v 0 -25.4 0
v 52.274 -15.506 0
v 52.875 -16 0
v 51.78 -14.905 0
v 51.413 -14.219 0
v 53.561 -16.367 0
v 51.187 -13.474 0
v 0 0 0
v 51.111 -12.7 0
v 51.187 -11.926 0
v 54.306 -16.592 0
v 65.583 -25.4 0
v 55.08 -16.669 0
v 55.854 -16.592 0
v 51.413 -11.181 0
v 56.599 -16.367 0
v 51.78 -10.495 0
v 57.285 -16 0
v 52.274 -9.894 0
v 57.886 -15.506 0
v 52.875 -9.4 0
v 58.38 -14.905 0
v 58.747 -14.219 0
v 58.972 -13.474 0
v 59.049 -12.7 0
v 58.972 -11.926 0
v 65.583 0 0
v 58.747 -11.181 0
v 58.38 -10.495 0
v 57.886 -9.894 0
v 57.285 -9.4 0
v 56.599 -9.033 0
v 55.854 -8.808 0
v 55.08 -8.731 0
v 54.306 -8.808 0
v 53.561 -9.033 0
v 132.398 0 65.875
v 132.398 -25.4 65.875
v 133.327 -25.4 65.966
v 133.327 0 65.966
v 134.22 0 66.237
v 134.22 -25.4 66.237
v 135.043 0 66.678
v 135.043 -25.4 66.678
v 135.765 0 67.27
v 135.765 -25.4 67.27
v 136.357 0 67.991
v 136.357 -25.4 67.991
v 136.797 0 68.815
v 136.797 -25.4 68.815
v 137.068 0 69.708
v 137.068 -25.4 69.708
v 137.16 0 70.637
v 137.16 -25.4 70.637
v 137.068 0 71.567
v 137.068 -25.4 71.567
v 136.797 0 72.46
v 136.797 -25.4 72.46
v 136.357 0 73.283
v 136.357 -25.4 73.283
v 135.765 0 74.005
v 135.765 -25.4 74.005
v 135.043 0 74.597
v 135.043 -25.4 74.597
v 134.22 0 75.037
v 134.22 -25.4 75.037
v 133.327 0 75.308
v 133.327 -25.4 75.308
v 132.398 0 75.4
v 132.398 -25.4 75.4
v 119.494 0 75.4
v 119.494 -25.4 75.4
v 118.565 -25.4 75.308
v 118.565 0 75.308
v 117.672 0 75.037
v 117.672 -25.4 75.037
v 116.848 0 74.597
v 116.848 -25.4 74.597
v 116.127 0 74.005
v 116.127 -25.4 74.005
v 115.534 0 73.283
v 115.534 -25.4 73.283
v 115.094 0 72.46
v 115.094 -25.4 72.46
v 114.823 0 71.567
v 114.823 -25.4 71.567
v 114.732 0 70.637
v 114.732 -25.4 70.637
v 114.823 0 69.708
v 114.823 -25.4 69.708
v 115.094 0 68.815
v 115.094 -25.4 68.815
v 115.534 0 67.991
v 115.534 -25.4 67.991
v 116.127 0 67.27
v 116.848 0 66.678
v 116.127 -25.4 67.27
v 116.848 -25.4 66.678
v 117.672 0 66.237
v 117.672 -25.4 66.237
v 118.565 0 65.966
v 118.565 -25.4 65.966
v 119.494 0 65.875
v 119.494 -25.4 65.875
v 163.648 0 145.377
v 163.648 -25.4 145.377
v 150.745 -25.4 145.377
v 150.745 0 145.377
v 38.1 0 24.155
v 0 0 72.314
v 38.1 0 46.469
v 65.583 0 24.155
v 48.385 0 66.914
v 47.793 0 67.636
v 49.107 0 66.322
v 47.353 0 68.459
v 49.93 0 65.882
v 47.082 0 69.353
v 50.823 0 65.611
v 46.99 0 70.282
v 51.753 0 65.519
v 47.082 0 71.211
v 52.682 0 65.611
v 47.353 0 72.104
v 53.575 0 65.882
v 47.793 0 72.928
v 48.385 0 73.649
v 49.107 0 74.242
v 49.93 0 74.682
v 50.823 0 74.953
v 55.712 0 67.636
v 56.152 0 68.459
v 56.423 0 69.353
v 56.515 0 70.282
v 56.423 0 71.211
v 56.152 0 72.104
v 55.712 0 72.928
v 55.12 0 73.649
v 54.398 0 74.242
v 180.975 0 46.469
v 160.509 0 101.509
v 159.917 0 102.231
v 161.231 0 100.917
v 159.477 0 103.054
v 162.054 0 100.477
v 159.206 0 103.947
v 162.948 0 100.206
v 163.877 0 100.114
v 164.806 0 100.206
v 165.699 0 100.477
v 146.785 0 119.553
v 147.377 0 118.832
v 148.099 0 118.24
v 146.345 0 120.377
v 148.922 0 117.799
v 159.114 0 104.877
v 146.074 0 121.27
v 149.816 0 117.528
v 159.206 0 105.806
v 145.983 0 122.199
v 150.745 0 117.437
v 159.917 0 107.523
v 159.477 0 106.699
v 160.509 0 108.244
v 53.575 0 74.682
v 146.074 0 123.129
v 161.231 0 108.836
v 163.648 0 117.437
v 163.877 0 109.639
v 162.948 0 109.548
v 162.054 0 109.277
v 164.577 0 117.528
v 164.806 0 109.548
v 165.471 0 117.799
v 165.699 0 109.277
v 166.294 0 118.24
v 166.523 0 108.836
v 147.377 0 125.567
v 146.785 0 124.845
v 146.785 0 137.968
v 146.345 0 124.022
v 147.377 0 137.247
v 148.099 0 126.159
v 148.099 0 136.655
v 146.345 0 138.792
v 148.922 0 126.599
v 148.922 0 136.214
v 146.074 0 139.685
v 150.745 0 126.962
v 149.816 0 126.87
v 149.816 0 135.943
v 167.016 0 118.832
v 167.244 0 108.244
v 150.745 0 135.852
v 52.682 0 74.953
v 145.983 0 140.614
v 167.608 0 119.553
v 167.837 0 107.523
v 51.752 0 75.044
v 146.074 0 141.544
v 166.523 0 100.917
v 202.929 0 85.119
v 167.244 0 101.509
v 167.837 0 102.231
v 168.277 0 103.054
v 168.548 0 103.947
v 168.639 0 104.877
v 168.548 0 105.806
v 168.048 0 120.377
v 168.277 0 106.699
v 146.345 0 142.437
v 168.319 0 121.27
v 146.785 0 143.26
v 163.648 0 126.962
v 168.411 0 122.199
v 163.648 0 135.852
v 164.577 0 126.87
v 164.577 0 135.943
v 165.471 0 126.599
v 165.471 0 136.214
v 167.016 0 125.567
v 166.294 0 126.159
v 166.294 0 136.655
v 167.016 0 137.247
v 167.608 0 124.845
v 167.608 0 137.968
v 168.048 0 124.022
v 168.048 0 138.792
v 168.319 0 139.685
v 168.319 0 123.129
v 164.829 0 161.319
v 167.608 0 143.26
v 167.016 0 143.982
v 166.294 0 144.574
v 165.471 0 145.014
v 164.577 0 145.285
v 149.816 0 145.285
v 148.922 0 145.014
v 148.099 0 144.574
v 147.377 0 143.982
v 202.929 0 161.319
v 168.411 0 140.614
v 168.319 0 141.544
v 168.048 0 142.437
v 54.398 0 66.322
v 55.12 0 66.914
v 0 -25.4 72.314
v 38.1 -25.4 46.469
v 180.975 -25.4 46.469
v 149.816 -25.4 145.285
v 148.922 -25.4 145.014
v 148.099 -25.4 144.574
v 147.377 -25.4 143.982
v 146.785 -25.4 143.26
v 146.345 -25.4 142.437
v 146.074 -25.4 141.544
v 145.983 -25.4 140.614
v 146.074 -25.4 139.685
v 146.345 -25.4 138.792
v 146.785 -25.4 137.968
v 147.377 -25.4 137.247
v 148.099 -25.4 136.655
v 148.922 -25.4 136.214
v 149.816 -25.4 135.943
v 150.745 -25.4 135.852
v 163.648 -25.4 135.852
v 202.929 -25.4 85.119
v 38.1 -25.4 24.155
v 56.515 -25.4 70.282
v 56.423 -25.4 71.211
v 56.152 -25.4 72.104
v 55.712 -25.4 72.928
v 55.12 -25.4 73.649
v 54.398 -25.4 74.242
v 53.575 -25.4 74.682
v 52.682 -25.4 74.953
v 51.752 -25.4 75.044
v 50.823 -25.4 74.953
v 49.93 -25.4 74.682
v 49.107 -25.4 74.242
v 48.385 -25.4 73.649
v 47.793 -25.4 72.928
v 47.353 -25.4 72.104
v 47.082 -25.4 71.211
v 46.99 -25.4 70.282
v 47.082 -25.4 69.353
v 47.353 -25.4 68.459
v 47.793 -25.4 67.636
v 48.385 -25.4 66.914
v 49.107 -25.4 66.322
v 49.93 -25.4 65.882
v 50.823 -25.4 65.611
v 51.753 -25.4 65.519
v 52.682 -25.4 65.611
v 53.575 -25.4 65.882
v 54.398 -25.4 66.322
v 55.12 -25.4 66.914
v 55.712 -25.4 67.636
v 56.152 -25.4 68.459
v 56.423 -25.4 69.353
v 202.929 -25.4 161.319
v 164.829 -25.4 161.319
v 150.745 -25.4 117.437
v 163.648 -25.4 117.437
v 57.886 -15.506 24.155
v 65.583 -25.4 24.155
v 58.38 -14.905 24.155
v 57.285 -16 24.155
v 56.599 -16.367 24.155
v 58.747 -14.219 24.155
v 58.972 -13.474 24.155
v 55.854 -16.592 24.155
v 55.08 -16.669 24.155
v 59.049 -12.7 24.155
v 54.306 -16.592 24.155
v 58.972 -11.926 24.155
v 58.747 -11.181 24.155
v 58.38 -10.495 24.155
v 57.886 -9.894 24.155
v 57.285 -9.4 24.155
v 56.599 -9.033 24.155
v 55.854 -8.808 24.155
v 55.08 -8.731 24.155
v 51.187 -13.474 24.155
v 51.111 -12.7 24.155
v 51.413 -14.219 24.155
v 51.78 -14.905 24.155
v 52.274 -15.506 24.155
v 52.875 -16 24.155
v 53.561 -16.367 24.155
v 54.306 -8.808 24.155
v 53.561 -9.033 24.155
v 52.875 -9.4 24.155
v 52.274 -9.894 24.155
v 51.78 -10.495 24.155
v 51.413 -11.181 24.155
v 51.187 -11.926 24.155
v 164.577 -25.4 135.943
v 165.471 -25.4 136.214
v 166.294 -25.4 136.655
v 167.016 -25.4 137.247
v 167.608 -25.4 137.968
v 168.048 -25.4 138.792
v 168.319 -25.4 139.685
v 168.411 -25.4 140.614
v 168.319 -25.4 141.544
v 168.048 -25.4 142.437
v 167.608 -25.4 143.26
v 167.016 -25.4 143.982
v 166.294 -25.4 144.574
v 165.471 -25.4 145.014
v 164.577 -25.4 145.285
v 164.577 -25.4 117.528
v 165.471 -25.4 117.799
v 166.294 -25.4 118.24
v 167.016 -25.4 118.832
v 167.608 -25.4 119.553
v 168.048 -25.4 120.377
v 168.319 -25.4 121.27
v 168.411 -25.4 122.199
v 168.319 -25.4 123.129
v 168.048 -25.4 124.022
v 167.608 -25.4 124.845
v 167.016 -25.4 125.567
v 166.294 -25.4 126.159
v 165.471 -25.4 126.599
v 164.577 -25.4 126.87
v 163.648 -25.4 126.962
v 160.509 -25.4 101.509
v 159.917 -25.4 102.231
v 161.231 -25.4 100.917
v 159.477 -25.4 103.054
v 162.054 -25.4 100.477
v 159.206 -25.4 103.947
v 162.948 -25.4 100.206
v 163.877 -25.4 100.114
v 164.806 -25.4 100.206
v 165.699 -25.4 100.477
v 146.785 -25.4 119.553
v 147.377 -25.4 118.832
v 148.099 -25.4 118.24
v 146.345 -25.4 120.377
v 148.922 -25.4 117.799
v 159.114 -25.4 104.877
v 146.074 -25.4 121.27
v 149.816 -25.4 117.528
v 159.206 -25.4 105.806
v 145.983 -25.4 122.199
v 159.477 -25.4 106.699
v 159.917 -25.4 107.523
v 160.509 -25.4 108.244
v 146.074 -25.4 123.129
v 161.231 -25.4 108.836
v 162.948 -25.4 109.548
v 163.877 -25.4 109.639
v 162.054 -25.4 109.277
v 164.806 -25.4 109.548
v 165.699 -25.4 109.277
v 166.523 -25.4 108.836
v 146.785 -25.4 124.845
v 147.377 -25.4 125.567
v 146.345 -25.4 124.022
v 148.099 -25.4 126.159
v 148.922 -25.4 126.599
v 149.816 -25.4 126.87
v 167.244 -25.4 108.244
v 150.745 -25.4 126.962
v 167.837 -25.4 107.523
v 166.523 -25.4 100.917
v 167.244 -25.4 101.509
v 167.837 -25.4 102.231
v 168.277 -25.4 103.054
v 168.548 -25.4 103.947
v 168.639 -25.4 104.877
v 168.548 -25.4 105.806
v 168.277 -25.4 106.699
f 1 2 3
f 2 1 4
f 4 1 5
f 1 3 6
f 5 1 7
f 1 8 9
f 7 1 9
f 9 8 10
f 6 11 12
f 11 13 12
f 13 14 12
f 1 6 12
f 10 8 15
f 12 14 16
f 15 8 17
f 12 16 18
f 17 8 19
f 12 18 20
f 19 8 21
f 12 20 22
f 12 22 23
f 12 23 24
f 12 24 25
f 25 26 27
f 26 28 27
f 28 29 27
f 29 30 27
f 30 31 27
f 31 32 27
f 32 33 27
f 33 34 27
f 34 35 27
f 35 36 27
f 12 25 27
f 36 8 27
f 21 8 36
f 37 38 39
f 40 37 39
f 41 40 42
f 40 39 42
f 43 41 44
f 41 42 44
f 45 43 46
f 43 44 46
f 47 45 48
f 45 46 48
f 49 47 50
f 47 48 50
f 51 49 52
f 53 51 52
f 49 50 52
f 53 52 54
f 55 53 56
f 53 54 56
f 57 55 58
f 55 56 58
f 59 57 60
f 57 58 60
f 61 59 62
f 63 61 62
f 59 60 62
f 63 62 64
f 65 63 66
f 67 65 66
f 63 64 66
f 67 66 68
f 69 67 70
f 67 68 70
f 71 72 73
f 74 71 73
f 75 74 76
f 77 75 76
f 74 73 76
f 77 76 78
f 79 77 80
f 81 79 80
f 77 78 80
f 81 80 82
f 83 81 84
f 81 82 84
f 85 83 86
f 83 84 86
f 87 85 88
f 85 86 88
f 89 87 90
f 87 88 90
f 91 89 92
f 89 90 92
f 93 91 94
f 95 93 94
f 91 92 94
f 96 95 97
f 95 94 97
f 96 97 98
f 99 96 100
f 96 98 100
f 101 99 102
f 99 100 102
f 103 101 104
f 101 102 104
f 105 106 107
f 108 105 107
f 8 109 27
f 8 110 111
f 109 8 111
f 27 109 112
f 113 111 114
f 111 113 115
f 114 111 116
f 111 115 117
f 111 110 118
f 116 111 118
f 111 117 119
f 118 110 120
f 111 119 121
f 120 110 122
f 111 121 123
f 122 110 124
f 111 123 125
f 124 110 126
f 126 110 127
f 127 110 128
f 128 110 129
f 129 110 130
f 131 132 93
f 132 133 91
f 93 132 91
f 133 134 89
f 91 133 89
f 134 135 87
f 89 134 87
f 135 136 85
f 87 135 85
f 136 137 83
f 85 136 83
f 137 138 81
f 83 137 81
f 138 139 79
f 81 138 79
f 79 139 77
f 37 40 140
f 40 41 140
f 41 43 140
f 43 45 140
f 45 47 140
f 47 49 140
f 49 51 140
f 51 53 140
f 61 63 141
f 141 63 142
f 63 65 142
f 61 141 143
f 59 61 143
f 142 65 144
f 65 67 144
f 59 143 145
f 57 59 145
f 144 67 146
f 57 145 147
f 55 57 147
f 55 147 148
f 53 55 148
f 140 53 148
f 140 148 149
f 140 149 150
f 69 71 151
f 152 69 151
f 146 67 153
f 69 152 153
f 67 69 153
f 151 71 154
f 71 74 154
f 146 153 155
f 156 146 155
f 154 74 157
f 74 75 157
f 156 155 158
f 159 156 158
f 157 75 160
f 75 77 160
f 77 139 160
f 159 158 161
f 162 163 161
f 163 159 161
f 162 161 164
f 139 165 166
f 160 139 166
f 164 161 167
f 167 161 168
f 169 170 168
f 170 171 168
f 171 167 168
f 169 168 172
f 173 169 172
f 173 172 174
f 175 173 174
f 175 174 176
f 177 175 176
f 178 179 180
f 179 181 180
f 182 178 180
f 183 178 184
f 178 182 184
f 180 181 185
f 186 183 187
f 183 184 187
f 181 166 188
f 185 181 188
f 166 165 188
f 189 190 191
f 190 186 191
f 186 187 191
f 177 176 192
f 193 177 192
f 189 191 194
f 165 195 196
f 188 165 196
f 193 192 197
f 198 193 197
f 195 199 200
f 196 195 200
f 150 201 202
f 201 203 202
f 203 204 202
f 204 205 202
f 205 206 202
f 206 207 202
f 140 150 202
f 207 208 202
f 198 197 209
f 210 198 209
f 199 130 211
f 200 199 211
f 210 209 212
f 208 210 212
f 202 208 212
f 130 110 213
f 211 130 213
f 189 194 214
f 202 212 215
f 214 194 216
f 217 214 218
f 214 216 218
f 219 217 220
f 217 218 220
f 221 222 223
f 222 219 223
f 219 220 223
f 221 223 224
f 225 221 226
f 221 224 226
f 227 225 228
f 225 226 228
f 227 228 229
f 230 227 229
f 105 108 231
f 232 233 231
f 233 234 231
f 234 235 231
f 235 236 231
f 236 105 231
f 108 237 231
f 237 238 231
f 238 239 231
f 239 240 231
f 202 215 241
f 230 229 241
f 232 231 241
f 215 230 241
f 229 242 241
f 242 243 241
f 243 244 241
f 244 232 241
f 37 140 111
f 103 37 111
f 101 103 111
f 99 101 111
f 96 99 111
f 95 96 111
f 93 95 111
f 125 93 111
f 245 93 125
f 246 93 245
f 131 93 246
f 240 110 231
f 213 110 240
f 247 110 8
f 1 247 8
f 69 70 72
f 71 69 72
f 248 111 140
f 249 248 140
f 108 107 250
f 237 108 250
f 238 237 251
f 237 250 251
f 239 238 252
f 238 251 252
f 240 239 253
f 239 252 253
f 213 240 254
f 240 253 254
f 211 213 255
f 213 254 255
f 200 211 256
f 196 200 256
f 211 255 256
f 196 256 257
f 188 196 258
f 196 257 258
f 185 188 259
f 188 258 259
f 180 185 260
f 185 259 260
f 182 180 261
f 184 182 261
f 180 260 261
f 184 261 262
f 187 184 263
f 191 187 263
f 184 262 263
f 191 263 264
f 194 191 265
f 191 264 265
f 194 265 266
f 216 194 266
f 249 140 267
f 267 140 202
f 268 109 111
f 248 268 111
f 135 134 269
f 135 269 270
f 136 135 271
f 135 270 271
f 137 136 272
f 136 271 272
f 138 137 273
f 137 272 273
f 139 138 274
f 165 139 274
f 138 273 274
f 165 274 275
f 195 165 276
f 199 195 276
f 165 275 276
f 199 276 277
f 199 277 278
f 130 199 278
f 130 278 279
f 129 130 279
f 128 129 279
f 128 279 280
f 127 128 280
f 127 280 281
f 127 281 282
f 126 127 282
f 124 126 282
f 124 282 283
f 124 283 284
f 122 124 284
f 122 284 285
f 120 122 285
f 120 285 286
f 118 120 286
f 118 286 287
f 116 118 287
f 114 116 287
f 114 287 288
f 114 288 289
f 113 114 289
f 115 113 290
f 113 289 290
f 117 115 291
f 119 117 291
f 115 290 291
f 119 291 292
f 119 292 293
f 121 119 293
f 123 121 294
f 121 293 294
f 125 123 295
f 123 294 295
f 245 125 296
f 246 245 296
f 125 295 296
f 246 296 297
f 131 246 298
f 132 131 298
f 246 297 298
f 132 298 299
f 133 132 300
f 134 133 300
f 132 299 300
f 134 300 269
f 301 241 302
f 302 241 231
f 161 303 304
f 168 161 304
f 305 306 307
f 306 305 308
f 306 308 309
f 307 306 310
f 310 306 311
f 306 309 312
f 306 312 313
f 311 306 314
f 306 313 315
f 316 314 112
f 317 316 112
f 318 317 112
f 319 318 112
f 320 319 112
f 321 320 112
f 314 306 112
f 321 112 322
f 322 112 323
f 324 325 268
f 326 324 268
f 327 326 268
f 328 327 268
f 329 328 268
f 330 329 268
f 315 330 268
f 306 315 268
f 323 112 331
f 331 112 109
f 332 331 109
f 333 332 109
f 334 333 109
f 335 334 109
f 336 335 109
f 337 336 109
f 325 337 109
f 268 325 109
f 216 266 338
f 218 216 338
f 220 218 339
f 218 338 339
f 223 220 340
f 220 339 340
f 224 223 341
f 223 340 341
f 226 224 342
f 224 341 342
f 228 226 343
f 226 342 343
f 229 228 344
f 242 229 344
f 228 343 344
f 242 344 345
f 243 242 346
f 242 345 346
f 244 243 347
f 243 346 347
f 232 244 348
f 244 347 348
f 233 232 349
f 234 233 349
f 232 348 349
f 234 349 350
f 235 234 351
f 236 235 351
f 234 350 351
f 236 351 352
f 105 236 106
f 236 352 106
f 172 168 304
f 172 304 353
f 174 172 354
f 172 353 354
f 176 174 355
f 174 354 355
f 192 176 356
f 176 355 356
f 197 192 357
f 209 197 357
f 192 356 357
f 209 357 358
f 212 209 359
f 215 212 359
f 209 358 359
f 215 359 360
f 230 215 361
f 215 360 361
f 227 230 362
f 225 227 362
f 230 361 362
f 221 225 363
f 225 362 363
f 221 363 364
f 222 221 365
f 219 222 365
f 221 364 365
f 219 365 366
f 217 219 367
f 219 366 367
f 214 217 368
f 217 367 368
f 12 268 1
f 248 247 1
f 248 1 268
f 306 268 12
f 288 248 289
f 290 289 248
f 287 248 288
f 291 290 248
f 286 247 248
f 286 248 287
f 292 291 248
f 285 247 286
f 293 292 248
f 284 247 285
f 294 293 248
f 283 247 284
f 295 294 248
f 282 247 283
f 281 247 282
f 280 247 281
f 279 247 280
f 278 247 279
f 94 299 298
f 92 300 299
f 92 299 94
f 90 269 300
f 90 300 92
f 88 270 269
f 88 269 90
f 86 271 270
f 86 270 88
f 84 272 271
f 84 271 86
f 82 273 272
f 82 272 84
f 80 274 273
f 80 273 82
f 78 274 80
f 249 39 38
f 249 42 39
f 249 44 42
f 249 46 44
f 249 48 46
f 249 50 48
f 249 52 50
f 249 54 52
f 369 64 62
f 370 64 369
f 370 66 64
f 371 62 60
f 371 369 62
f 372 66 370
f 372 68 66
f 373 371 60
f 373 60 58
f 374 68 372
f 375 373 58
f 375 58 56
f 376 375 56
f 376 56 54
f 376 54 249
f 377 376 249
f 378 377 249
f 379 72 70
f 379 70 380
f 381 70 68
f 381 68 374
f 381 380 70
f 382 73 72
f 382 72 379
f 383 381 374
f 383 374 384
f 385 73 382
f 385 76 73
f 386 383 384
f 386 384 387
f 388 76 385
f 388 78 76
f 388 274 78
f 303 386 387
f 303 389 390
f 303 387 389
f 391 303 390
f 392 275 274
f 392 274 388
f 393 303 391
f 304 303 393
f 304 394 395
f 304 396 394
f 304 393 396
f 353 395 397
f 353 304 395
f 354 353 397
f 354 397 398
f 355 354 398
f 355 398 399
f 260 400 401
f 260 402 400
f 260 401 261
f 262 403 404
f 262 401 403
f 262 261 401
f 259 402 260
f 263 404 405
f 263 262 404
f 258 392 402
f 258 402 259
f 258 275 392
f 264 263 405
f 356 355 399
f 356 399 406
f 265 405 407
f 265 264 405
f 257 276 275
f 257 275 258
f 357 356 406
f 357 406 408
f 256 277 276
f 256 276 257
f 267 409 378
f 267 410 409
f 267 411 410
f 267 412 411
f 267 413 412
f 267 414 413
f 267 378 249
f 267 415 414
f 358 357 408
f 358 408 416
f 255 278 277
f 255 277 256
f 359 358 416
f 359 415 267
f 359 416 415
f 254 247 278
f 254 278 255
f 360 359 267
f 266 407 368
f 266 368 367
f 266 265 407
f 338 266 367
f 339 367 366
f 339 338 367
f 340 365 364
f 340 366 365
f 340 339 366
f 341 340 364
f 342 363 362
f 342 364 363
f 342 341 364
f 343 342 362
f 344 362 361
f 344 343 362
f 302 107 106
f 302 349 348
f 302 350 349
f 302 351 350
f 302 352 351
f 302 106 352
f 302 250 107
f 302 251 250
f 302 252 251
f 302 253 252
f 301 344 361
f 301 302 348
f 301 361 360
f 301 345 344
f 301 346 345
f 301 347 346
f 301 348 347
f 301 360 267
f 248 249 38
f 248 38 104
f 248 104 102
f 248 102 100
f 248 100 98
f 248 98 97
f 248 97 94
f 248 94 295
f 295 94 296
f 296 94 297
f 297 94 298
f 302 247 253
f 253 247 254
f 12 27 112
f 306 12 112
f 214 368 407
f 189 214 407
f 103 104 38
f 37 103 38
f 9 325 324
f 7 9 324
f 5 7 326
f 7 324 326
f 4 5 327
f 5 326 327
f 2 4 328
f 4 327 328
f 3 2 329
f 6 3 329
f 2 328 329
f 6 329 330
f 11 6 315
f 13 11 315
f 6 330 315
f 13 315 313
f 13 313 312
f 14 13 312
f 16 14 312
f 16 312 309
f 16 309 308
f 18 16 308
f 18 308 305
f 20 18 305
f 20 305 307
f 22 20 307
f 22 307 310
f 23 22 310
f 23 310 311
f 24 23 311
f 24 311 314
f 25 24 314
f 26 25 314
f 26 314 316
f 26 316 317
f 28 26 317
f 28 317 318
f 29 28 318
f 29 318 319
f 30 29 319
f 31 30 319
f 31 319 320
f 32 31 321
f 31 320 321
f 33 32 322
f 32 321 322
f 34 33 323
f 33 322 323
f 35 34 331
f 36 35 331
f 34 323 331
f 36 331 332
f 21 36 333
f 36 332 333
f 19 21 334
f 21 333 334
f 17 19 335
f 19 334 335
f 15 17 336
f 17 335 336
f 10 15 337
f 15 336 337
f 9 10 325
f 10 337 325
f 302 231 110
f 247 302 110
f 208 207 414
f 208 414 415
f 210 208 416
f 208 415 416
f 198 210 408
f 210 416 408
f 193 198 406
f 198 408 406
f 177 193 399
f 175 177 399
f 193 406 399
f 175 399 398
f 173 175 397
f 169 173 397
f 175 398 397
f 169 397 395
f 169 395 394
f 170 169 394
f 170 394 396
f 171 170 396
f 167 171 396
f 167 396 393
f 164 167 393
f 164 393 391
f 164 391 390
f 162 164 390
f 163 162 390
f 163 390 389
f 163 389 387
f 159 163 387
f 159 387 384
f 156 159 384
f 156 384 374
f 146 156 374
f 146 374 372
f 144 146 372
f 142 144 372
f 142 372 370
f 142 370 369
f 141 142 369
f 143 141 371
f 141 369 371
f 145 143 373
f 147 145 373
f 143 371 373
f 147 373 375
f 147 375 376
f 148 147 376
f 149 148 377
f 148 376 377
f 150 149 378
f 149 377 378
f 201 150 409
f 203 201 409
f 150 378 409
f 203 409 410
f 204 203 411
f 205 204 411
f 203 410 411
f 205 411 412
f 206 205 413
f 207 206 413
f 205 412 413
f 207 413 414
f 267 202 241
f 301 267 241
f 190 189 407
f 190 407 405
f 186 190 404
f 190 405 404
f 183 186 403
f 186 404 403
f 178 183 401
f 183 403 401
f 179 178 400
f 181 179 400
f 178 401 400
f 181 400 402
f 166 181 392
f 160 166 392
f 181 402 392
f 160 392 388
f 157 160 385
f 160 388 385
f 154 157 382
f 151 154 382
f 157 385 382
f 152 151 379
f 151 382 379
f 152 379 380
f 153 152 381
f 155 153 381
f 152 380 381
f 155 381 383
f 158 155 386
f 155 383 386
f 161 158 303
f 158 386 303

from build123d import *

# Parameters (mm, degrees)
F1_DEPTH = 25.4
F2_R     = 4.7625
F3_DEPTH = 25.401
F5_D     = 7.9375
F5_DEPTH = 25.4
F5_TIP   = 2.3846655818


with BuildPart() as f1:
    # F0 (on Front) → F1 (new body)
    with BuildSketch(Plane.XZ):
        Polygon((0, 72.3138), (0, 0), (65.5828, 0), (65.5828, 24.1554), (38.1, 24.1554), (38.1, 46.4693), (180.975, 46.4693), (202.9293194803, 85.1191428995), (202.9293194803, 161.3191428995), (164.8293194803, 161.3191428995), align=None)
    extrude(amount=F1_DEPTH)

    # F2 (on face) → F3 (cut, through all)
    with BuildSketch(Plane.XZ.offset(25.4)):
        with Locations((51.7525, 70.2818)):
            Circle(F2_R)
        with Locations((163.8768194803, 104.8766)):
            Circle(F2_R)
        with BuildLine():
            Line((132.3975, 75.3999), (119.4943, 75.3999))
            ThreePointArc((119.4943, 75.3999), (114.7318, 70.6374), (119.4943, 65.8749))
            Line((119.4943, 65.8749), (132.3975, 65.8749))
            ThreePointArc((132.3975, 65.8749), (137.16, 70.6374), (132.3975, 75.3999))
        make_face()
        with BuildLine():
            Line((163.6482194803, 145.3769), (150.7450194803, 145.3769))
            ThreePointArc((150.7450194803, 145.3769), (145.9825194803, 140.6144), (150.7450194803, 135.8519))
            Line((150.7450194803, 135.8519), (163.6482194803, 135.8519))
            ThreePointArc((163.6482194803, 135.8519), (168.4107194803, 140.6144), (163.6482194803, 145.3769))
        make_face()
        with BuildLine():
            Line((163.6482194803, 126.9619), (150.7450194803, 126.9619))
            ThreePointArc((150.7450194803, 126.9619), (145.9825194803, 122.1994), (150.7450194803, 117.4369))
            Line((150.7450194803, 117.4369), (163.6482194803, 117.4369))
            ThreePointArc((163.6482194803, 117.4369), (168.4107194803, 122.1994), (163.6482194803, 126.9619))
        make_face()
    extrude(amount=-F3_DEPTH, mode=Mode.SUBTRACT)

    # F5
    with Locations(Plane(origin=(0, 0, 0), x_dir=(1, 0, 0), z_dir=(0, 0, -1))):
        with Locations((55.0799, 12.7)):
            Hole(F5_D / 2, depth=F5_DEPTH)
            with Locations((0, 0, -(F5_DEPTH + F5_TIP / 2))):  # 118° drill point
                Cone(0, F5_D / 2, F5_TIP, mode=Mode.SUBTRACT)


solid = f1.part
